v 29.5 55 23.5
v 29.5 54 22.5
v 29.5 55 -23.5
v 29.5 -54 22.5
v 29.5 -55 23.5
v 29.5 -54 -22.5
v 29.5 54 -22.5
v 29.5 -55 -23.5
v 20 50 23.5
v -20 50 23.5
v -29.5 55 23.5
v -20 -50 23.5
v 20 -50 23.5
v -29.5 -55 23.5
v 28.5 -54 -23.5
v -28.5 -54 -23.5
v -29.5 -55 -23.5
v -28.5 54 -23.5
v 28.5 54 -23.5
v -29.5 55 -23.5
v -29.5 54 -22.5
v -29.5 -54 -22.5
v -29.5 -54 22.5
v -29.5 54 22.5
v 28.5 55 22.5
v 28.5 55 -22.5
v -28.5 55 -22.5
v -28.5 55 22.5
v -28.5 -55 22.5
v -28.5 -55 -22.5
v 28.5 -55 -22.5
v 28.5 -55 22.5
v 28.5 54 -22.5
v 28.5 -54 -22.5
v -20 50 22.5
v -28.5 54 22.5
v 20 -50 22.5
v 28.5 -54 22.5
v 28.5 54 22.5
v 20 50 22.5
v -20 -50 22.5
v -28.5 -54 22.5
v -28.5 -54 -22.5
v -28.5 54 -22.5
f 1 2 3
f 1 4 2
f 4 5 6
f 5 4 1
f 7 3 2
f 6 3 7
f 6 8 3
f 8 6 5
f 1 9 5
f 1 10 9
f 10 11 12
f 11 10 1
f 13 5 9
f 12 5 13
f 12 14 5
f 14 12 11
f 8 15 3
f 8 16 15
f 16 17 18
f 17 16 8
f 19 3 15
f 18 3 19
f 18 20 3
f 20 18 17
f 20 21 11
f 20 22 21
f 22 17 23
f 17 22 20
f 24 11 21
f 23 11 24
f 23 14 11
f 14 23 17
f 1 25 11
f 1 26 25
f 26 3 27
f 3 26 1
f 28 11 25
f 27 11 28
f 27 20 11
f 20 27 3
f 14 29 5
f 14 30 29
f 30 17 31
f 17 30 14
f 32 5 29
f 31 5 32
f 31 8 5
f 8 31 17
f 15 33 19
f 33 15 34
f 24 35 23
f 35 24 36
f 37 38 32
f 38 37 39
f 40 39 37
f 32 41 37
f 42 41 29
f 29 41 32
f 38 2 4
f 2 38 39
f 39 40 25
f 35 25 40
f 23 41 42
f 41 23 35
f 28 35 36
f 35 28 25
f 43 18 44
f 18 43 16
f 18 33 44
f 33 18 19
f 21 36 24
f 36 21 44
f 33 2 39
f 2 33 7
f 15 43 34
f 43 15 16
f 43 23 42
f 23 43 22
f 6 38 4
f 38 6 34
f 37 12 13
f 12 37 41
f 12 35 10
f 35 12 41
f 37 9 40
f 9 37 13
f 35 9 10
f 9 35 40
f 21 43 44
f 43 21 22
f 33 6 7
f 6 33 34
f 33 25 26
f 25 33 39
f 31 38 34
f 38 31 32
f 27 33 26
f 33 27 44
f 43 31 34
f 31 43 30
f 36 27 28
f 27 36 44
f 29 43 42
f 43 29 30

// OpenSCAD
//Meta los valores
x = 59;
y = 22/*ancho de un servo*/*5/*servos*/;
z = 47;


difference(){
cube([x, y, z], center=true);
#cube([x-2, y-2, z-2], center=true);
translate([0, 0, -27])
#cube([x-2, y-2, z+50], center=true);
translate([0,0,0])
rotate([0,0,90])
#cube([20*5, 40, 50], center=true); /*Hueco del motor*/
#cube([x+50, y-2, z-2], center=true);
#cube([x-2, y+50, z-2], center=true);
}
